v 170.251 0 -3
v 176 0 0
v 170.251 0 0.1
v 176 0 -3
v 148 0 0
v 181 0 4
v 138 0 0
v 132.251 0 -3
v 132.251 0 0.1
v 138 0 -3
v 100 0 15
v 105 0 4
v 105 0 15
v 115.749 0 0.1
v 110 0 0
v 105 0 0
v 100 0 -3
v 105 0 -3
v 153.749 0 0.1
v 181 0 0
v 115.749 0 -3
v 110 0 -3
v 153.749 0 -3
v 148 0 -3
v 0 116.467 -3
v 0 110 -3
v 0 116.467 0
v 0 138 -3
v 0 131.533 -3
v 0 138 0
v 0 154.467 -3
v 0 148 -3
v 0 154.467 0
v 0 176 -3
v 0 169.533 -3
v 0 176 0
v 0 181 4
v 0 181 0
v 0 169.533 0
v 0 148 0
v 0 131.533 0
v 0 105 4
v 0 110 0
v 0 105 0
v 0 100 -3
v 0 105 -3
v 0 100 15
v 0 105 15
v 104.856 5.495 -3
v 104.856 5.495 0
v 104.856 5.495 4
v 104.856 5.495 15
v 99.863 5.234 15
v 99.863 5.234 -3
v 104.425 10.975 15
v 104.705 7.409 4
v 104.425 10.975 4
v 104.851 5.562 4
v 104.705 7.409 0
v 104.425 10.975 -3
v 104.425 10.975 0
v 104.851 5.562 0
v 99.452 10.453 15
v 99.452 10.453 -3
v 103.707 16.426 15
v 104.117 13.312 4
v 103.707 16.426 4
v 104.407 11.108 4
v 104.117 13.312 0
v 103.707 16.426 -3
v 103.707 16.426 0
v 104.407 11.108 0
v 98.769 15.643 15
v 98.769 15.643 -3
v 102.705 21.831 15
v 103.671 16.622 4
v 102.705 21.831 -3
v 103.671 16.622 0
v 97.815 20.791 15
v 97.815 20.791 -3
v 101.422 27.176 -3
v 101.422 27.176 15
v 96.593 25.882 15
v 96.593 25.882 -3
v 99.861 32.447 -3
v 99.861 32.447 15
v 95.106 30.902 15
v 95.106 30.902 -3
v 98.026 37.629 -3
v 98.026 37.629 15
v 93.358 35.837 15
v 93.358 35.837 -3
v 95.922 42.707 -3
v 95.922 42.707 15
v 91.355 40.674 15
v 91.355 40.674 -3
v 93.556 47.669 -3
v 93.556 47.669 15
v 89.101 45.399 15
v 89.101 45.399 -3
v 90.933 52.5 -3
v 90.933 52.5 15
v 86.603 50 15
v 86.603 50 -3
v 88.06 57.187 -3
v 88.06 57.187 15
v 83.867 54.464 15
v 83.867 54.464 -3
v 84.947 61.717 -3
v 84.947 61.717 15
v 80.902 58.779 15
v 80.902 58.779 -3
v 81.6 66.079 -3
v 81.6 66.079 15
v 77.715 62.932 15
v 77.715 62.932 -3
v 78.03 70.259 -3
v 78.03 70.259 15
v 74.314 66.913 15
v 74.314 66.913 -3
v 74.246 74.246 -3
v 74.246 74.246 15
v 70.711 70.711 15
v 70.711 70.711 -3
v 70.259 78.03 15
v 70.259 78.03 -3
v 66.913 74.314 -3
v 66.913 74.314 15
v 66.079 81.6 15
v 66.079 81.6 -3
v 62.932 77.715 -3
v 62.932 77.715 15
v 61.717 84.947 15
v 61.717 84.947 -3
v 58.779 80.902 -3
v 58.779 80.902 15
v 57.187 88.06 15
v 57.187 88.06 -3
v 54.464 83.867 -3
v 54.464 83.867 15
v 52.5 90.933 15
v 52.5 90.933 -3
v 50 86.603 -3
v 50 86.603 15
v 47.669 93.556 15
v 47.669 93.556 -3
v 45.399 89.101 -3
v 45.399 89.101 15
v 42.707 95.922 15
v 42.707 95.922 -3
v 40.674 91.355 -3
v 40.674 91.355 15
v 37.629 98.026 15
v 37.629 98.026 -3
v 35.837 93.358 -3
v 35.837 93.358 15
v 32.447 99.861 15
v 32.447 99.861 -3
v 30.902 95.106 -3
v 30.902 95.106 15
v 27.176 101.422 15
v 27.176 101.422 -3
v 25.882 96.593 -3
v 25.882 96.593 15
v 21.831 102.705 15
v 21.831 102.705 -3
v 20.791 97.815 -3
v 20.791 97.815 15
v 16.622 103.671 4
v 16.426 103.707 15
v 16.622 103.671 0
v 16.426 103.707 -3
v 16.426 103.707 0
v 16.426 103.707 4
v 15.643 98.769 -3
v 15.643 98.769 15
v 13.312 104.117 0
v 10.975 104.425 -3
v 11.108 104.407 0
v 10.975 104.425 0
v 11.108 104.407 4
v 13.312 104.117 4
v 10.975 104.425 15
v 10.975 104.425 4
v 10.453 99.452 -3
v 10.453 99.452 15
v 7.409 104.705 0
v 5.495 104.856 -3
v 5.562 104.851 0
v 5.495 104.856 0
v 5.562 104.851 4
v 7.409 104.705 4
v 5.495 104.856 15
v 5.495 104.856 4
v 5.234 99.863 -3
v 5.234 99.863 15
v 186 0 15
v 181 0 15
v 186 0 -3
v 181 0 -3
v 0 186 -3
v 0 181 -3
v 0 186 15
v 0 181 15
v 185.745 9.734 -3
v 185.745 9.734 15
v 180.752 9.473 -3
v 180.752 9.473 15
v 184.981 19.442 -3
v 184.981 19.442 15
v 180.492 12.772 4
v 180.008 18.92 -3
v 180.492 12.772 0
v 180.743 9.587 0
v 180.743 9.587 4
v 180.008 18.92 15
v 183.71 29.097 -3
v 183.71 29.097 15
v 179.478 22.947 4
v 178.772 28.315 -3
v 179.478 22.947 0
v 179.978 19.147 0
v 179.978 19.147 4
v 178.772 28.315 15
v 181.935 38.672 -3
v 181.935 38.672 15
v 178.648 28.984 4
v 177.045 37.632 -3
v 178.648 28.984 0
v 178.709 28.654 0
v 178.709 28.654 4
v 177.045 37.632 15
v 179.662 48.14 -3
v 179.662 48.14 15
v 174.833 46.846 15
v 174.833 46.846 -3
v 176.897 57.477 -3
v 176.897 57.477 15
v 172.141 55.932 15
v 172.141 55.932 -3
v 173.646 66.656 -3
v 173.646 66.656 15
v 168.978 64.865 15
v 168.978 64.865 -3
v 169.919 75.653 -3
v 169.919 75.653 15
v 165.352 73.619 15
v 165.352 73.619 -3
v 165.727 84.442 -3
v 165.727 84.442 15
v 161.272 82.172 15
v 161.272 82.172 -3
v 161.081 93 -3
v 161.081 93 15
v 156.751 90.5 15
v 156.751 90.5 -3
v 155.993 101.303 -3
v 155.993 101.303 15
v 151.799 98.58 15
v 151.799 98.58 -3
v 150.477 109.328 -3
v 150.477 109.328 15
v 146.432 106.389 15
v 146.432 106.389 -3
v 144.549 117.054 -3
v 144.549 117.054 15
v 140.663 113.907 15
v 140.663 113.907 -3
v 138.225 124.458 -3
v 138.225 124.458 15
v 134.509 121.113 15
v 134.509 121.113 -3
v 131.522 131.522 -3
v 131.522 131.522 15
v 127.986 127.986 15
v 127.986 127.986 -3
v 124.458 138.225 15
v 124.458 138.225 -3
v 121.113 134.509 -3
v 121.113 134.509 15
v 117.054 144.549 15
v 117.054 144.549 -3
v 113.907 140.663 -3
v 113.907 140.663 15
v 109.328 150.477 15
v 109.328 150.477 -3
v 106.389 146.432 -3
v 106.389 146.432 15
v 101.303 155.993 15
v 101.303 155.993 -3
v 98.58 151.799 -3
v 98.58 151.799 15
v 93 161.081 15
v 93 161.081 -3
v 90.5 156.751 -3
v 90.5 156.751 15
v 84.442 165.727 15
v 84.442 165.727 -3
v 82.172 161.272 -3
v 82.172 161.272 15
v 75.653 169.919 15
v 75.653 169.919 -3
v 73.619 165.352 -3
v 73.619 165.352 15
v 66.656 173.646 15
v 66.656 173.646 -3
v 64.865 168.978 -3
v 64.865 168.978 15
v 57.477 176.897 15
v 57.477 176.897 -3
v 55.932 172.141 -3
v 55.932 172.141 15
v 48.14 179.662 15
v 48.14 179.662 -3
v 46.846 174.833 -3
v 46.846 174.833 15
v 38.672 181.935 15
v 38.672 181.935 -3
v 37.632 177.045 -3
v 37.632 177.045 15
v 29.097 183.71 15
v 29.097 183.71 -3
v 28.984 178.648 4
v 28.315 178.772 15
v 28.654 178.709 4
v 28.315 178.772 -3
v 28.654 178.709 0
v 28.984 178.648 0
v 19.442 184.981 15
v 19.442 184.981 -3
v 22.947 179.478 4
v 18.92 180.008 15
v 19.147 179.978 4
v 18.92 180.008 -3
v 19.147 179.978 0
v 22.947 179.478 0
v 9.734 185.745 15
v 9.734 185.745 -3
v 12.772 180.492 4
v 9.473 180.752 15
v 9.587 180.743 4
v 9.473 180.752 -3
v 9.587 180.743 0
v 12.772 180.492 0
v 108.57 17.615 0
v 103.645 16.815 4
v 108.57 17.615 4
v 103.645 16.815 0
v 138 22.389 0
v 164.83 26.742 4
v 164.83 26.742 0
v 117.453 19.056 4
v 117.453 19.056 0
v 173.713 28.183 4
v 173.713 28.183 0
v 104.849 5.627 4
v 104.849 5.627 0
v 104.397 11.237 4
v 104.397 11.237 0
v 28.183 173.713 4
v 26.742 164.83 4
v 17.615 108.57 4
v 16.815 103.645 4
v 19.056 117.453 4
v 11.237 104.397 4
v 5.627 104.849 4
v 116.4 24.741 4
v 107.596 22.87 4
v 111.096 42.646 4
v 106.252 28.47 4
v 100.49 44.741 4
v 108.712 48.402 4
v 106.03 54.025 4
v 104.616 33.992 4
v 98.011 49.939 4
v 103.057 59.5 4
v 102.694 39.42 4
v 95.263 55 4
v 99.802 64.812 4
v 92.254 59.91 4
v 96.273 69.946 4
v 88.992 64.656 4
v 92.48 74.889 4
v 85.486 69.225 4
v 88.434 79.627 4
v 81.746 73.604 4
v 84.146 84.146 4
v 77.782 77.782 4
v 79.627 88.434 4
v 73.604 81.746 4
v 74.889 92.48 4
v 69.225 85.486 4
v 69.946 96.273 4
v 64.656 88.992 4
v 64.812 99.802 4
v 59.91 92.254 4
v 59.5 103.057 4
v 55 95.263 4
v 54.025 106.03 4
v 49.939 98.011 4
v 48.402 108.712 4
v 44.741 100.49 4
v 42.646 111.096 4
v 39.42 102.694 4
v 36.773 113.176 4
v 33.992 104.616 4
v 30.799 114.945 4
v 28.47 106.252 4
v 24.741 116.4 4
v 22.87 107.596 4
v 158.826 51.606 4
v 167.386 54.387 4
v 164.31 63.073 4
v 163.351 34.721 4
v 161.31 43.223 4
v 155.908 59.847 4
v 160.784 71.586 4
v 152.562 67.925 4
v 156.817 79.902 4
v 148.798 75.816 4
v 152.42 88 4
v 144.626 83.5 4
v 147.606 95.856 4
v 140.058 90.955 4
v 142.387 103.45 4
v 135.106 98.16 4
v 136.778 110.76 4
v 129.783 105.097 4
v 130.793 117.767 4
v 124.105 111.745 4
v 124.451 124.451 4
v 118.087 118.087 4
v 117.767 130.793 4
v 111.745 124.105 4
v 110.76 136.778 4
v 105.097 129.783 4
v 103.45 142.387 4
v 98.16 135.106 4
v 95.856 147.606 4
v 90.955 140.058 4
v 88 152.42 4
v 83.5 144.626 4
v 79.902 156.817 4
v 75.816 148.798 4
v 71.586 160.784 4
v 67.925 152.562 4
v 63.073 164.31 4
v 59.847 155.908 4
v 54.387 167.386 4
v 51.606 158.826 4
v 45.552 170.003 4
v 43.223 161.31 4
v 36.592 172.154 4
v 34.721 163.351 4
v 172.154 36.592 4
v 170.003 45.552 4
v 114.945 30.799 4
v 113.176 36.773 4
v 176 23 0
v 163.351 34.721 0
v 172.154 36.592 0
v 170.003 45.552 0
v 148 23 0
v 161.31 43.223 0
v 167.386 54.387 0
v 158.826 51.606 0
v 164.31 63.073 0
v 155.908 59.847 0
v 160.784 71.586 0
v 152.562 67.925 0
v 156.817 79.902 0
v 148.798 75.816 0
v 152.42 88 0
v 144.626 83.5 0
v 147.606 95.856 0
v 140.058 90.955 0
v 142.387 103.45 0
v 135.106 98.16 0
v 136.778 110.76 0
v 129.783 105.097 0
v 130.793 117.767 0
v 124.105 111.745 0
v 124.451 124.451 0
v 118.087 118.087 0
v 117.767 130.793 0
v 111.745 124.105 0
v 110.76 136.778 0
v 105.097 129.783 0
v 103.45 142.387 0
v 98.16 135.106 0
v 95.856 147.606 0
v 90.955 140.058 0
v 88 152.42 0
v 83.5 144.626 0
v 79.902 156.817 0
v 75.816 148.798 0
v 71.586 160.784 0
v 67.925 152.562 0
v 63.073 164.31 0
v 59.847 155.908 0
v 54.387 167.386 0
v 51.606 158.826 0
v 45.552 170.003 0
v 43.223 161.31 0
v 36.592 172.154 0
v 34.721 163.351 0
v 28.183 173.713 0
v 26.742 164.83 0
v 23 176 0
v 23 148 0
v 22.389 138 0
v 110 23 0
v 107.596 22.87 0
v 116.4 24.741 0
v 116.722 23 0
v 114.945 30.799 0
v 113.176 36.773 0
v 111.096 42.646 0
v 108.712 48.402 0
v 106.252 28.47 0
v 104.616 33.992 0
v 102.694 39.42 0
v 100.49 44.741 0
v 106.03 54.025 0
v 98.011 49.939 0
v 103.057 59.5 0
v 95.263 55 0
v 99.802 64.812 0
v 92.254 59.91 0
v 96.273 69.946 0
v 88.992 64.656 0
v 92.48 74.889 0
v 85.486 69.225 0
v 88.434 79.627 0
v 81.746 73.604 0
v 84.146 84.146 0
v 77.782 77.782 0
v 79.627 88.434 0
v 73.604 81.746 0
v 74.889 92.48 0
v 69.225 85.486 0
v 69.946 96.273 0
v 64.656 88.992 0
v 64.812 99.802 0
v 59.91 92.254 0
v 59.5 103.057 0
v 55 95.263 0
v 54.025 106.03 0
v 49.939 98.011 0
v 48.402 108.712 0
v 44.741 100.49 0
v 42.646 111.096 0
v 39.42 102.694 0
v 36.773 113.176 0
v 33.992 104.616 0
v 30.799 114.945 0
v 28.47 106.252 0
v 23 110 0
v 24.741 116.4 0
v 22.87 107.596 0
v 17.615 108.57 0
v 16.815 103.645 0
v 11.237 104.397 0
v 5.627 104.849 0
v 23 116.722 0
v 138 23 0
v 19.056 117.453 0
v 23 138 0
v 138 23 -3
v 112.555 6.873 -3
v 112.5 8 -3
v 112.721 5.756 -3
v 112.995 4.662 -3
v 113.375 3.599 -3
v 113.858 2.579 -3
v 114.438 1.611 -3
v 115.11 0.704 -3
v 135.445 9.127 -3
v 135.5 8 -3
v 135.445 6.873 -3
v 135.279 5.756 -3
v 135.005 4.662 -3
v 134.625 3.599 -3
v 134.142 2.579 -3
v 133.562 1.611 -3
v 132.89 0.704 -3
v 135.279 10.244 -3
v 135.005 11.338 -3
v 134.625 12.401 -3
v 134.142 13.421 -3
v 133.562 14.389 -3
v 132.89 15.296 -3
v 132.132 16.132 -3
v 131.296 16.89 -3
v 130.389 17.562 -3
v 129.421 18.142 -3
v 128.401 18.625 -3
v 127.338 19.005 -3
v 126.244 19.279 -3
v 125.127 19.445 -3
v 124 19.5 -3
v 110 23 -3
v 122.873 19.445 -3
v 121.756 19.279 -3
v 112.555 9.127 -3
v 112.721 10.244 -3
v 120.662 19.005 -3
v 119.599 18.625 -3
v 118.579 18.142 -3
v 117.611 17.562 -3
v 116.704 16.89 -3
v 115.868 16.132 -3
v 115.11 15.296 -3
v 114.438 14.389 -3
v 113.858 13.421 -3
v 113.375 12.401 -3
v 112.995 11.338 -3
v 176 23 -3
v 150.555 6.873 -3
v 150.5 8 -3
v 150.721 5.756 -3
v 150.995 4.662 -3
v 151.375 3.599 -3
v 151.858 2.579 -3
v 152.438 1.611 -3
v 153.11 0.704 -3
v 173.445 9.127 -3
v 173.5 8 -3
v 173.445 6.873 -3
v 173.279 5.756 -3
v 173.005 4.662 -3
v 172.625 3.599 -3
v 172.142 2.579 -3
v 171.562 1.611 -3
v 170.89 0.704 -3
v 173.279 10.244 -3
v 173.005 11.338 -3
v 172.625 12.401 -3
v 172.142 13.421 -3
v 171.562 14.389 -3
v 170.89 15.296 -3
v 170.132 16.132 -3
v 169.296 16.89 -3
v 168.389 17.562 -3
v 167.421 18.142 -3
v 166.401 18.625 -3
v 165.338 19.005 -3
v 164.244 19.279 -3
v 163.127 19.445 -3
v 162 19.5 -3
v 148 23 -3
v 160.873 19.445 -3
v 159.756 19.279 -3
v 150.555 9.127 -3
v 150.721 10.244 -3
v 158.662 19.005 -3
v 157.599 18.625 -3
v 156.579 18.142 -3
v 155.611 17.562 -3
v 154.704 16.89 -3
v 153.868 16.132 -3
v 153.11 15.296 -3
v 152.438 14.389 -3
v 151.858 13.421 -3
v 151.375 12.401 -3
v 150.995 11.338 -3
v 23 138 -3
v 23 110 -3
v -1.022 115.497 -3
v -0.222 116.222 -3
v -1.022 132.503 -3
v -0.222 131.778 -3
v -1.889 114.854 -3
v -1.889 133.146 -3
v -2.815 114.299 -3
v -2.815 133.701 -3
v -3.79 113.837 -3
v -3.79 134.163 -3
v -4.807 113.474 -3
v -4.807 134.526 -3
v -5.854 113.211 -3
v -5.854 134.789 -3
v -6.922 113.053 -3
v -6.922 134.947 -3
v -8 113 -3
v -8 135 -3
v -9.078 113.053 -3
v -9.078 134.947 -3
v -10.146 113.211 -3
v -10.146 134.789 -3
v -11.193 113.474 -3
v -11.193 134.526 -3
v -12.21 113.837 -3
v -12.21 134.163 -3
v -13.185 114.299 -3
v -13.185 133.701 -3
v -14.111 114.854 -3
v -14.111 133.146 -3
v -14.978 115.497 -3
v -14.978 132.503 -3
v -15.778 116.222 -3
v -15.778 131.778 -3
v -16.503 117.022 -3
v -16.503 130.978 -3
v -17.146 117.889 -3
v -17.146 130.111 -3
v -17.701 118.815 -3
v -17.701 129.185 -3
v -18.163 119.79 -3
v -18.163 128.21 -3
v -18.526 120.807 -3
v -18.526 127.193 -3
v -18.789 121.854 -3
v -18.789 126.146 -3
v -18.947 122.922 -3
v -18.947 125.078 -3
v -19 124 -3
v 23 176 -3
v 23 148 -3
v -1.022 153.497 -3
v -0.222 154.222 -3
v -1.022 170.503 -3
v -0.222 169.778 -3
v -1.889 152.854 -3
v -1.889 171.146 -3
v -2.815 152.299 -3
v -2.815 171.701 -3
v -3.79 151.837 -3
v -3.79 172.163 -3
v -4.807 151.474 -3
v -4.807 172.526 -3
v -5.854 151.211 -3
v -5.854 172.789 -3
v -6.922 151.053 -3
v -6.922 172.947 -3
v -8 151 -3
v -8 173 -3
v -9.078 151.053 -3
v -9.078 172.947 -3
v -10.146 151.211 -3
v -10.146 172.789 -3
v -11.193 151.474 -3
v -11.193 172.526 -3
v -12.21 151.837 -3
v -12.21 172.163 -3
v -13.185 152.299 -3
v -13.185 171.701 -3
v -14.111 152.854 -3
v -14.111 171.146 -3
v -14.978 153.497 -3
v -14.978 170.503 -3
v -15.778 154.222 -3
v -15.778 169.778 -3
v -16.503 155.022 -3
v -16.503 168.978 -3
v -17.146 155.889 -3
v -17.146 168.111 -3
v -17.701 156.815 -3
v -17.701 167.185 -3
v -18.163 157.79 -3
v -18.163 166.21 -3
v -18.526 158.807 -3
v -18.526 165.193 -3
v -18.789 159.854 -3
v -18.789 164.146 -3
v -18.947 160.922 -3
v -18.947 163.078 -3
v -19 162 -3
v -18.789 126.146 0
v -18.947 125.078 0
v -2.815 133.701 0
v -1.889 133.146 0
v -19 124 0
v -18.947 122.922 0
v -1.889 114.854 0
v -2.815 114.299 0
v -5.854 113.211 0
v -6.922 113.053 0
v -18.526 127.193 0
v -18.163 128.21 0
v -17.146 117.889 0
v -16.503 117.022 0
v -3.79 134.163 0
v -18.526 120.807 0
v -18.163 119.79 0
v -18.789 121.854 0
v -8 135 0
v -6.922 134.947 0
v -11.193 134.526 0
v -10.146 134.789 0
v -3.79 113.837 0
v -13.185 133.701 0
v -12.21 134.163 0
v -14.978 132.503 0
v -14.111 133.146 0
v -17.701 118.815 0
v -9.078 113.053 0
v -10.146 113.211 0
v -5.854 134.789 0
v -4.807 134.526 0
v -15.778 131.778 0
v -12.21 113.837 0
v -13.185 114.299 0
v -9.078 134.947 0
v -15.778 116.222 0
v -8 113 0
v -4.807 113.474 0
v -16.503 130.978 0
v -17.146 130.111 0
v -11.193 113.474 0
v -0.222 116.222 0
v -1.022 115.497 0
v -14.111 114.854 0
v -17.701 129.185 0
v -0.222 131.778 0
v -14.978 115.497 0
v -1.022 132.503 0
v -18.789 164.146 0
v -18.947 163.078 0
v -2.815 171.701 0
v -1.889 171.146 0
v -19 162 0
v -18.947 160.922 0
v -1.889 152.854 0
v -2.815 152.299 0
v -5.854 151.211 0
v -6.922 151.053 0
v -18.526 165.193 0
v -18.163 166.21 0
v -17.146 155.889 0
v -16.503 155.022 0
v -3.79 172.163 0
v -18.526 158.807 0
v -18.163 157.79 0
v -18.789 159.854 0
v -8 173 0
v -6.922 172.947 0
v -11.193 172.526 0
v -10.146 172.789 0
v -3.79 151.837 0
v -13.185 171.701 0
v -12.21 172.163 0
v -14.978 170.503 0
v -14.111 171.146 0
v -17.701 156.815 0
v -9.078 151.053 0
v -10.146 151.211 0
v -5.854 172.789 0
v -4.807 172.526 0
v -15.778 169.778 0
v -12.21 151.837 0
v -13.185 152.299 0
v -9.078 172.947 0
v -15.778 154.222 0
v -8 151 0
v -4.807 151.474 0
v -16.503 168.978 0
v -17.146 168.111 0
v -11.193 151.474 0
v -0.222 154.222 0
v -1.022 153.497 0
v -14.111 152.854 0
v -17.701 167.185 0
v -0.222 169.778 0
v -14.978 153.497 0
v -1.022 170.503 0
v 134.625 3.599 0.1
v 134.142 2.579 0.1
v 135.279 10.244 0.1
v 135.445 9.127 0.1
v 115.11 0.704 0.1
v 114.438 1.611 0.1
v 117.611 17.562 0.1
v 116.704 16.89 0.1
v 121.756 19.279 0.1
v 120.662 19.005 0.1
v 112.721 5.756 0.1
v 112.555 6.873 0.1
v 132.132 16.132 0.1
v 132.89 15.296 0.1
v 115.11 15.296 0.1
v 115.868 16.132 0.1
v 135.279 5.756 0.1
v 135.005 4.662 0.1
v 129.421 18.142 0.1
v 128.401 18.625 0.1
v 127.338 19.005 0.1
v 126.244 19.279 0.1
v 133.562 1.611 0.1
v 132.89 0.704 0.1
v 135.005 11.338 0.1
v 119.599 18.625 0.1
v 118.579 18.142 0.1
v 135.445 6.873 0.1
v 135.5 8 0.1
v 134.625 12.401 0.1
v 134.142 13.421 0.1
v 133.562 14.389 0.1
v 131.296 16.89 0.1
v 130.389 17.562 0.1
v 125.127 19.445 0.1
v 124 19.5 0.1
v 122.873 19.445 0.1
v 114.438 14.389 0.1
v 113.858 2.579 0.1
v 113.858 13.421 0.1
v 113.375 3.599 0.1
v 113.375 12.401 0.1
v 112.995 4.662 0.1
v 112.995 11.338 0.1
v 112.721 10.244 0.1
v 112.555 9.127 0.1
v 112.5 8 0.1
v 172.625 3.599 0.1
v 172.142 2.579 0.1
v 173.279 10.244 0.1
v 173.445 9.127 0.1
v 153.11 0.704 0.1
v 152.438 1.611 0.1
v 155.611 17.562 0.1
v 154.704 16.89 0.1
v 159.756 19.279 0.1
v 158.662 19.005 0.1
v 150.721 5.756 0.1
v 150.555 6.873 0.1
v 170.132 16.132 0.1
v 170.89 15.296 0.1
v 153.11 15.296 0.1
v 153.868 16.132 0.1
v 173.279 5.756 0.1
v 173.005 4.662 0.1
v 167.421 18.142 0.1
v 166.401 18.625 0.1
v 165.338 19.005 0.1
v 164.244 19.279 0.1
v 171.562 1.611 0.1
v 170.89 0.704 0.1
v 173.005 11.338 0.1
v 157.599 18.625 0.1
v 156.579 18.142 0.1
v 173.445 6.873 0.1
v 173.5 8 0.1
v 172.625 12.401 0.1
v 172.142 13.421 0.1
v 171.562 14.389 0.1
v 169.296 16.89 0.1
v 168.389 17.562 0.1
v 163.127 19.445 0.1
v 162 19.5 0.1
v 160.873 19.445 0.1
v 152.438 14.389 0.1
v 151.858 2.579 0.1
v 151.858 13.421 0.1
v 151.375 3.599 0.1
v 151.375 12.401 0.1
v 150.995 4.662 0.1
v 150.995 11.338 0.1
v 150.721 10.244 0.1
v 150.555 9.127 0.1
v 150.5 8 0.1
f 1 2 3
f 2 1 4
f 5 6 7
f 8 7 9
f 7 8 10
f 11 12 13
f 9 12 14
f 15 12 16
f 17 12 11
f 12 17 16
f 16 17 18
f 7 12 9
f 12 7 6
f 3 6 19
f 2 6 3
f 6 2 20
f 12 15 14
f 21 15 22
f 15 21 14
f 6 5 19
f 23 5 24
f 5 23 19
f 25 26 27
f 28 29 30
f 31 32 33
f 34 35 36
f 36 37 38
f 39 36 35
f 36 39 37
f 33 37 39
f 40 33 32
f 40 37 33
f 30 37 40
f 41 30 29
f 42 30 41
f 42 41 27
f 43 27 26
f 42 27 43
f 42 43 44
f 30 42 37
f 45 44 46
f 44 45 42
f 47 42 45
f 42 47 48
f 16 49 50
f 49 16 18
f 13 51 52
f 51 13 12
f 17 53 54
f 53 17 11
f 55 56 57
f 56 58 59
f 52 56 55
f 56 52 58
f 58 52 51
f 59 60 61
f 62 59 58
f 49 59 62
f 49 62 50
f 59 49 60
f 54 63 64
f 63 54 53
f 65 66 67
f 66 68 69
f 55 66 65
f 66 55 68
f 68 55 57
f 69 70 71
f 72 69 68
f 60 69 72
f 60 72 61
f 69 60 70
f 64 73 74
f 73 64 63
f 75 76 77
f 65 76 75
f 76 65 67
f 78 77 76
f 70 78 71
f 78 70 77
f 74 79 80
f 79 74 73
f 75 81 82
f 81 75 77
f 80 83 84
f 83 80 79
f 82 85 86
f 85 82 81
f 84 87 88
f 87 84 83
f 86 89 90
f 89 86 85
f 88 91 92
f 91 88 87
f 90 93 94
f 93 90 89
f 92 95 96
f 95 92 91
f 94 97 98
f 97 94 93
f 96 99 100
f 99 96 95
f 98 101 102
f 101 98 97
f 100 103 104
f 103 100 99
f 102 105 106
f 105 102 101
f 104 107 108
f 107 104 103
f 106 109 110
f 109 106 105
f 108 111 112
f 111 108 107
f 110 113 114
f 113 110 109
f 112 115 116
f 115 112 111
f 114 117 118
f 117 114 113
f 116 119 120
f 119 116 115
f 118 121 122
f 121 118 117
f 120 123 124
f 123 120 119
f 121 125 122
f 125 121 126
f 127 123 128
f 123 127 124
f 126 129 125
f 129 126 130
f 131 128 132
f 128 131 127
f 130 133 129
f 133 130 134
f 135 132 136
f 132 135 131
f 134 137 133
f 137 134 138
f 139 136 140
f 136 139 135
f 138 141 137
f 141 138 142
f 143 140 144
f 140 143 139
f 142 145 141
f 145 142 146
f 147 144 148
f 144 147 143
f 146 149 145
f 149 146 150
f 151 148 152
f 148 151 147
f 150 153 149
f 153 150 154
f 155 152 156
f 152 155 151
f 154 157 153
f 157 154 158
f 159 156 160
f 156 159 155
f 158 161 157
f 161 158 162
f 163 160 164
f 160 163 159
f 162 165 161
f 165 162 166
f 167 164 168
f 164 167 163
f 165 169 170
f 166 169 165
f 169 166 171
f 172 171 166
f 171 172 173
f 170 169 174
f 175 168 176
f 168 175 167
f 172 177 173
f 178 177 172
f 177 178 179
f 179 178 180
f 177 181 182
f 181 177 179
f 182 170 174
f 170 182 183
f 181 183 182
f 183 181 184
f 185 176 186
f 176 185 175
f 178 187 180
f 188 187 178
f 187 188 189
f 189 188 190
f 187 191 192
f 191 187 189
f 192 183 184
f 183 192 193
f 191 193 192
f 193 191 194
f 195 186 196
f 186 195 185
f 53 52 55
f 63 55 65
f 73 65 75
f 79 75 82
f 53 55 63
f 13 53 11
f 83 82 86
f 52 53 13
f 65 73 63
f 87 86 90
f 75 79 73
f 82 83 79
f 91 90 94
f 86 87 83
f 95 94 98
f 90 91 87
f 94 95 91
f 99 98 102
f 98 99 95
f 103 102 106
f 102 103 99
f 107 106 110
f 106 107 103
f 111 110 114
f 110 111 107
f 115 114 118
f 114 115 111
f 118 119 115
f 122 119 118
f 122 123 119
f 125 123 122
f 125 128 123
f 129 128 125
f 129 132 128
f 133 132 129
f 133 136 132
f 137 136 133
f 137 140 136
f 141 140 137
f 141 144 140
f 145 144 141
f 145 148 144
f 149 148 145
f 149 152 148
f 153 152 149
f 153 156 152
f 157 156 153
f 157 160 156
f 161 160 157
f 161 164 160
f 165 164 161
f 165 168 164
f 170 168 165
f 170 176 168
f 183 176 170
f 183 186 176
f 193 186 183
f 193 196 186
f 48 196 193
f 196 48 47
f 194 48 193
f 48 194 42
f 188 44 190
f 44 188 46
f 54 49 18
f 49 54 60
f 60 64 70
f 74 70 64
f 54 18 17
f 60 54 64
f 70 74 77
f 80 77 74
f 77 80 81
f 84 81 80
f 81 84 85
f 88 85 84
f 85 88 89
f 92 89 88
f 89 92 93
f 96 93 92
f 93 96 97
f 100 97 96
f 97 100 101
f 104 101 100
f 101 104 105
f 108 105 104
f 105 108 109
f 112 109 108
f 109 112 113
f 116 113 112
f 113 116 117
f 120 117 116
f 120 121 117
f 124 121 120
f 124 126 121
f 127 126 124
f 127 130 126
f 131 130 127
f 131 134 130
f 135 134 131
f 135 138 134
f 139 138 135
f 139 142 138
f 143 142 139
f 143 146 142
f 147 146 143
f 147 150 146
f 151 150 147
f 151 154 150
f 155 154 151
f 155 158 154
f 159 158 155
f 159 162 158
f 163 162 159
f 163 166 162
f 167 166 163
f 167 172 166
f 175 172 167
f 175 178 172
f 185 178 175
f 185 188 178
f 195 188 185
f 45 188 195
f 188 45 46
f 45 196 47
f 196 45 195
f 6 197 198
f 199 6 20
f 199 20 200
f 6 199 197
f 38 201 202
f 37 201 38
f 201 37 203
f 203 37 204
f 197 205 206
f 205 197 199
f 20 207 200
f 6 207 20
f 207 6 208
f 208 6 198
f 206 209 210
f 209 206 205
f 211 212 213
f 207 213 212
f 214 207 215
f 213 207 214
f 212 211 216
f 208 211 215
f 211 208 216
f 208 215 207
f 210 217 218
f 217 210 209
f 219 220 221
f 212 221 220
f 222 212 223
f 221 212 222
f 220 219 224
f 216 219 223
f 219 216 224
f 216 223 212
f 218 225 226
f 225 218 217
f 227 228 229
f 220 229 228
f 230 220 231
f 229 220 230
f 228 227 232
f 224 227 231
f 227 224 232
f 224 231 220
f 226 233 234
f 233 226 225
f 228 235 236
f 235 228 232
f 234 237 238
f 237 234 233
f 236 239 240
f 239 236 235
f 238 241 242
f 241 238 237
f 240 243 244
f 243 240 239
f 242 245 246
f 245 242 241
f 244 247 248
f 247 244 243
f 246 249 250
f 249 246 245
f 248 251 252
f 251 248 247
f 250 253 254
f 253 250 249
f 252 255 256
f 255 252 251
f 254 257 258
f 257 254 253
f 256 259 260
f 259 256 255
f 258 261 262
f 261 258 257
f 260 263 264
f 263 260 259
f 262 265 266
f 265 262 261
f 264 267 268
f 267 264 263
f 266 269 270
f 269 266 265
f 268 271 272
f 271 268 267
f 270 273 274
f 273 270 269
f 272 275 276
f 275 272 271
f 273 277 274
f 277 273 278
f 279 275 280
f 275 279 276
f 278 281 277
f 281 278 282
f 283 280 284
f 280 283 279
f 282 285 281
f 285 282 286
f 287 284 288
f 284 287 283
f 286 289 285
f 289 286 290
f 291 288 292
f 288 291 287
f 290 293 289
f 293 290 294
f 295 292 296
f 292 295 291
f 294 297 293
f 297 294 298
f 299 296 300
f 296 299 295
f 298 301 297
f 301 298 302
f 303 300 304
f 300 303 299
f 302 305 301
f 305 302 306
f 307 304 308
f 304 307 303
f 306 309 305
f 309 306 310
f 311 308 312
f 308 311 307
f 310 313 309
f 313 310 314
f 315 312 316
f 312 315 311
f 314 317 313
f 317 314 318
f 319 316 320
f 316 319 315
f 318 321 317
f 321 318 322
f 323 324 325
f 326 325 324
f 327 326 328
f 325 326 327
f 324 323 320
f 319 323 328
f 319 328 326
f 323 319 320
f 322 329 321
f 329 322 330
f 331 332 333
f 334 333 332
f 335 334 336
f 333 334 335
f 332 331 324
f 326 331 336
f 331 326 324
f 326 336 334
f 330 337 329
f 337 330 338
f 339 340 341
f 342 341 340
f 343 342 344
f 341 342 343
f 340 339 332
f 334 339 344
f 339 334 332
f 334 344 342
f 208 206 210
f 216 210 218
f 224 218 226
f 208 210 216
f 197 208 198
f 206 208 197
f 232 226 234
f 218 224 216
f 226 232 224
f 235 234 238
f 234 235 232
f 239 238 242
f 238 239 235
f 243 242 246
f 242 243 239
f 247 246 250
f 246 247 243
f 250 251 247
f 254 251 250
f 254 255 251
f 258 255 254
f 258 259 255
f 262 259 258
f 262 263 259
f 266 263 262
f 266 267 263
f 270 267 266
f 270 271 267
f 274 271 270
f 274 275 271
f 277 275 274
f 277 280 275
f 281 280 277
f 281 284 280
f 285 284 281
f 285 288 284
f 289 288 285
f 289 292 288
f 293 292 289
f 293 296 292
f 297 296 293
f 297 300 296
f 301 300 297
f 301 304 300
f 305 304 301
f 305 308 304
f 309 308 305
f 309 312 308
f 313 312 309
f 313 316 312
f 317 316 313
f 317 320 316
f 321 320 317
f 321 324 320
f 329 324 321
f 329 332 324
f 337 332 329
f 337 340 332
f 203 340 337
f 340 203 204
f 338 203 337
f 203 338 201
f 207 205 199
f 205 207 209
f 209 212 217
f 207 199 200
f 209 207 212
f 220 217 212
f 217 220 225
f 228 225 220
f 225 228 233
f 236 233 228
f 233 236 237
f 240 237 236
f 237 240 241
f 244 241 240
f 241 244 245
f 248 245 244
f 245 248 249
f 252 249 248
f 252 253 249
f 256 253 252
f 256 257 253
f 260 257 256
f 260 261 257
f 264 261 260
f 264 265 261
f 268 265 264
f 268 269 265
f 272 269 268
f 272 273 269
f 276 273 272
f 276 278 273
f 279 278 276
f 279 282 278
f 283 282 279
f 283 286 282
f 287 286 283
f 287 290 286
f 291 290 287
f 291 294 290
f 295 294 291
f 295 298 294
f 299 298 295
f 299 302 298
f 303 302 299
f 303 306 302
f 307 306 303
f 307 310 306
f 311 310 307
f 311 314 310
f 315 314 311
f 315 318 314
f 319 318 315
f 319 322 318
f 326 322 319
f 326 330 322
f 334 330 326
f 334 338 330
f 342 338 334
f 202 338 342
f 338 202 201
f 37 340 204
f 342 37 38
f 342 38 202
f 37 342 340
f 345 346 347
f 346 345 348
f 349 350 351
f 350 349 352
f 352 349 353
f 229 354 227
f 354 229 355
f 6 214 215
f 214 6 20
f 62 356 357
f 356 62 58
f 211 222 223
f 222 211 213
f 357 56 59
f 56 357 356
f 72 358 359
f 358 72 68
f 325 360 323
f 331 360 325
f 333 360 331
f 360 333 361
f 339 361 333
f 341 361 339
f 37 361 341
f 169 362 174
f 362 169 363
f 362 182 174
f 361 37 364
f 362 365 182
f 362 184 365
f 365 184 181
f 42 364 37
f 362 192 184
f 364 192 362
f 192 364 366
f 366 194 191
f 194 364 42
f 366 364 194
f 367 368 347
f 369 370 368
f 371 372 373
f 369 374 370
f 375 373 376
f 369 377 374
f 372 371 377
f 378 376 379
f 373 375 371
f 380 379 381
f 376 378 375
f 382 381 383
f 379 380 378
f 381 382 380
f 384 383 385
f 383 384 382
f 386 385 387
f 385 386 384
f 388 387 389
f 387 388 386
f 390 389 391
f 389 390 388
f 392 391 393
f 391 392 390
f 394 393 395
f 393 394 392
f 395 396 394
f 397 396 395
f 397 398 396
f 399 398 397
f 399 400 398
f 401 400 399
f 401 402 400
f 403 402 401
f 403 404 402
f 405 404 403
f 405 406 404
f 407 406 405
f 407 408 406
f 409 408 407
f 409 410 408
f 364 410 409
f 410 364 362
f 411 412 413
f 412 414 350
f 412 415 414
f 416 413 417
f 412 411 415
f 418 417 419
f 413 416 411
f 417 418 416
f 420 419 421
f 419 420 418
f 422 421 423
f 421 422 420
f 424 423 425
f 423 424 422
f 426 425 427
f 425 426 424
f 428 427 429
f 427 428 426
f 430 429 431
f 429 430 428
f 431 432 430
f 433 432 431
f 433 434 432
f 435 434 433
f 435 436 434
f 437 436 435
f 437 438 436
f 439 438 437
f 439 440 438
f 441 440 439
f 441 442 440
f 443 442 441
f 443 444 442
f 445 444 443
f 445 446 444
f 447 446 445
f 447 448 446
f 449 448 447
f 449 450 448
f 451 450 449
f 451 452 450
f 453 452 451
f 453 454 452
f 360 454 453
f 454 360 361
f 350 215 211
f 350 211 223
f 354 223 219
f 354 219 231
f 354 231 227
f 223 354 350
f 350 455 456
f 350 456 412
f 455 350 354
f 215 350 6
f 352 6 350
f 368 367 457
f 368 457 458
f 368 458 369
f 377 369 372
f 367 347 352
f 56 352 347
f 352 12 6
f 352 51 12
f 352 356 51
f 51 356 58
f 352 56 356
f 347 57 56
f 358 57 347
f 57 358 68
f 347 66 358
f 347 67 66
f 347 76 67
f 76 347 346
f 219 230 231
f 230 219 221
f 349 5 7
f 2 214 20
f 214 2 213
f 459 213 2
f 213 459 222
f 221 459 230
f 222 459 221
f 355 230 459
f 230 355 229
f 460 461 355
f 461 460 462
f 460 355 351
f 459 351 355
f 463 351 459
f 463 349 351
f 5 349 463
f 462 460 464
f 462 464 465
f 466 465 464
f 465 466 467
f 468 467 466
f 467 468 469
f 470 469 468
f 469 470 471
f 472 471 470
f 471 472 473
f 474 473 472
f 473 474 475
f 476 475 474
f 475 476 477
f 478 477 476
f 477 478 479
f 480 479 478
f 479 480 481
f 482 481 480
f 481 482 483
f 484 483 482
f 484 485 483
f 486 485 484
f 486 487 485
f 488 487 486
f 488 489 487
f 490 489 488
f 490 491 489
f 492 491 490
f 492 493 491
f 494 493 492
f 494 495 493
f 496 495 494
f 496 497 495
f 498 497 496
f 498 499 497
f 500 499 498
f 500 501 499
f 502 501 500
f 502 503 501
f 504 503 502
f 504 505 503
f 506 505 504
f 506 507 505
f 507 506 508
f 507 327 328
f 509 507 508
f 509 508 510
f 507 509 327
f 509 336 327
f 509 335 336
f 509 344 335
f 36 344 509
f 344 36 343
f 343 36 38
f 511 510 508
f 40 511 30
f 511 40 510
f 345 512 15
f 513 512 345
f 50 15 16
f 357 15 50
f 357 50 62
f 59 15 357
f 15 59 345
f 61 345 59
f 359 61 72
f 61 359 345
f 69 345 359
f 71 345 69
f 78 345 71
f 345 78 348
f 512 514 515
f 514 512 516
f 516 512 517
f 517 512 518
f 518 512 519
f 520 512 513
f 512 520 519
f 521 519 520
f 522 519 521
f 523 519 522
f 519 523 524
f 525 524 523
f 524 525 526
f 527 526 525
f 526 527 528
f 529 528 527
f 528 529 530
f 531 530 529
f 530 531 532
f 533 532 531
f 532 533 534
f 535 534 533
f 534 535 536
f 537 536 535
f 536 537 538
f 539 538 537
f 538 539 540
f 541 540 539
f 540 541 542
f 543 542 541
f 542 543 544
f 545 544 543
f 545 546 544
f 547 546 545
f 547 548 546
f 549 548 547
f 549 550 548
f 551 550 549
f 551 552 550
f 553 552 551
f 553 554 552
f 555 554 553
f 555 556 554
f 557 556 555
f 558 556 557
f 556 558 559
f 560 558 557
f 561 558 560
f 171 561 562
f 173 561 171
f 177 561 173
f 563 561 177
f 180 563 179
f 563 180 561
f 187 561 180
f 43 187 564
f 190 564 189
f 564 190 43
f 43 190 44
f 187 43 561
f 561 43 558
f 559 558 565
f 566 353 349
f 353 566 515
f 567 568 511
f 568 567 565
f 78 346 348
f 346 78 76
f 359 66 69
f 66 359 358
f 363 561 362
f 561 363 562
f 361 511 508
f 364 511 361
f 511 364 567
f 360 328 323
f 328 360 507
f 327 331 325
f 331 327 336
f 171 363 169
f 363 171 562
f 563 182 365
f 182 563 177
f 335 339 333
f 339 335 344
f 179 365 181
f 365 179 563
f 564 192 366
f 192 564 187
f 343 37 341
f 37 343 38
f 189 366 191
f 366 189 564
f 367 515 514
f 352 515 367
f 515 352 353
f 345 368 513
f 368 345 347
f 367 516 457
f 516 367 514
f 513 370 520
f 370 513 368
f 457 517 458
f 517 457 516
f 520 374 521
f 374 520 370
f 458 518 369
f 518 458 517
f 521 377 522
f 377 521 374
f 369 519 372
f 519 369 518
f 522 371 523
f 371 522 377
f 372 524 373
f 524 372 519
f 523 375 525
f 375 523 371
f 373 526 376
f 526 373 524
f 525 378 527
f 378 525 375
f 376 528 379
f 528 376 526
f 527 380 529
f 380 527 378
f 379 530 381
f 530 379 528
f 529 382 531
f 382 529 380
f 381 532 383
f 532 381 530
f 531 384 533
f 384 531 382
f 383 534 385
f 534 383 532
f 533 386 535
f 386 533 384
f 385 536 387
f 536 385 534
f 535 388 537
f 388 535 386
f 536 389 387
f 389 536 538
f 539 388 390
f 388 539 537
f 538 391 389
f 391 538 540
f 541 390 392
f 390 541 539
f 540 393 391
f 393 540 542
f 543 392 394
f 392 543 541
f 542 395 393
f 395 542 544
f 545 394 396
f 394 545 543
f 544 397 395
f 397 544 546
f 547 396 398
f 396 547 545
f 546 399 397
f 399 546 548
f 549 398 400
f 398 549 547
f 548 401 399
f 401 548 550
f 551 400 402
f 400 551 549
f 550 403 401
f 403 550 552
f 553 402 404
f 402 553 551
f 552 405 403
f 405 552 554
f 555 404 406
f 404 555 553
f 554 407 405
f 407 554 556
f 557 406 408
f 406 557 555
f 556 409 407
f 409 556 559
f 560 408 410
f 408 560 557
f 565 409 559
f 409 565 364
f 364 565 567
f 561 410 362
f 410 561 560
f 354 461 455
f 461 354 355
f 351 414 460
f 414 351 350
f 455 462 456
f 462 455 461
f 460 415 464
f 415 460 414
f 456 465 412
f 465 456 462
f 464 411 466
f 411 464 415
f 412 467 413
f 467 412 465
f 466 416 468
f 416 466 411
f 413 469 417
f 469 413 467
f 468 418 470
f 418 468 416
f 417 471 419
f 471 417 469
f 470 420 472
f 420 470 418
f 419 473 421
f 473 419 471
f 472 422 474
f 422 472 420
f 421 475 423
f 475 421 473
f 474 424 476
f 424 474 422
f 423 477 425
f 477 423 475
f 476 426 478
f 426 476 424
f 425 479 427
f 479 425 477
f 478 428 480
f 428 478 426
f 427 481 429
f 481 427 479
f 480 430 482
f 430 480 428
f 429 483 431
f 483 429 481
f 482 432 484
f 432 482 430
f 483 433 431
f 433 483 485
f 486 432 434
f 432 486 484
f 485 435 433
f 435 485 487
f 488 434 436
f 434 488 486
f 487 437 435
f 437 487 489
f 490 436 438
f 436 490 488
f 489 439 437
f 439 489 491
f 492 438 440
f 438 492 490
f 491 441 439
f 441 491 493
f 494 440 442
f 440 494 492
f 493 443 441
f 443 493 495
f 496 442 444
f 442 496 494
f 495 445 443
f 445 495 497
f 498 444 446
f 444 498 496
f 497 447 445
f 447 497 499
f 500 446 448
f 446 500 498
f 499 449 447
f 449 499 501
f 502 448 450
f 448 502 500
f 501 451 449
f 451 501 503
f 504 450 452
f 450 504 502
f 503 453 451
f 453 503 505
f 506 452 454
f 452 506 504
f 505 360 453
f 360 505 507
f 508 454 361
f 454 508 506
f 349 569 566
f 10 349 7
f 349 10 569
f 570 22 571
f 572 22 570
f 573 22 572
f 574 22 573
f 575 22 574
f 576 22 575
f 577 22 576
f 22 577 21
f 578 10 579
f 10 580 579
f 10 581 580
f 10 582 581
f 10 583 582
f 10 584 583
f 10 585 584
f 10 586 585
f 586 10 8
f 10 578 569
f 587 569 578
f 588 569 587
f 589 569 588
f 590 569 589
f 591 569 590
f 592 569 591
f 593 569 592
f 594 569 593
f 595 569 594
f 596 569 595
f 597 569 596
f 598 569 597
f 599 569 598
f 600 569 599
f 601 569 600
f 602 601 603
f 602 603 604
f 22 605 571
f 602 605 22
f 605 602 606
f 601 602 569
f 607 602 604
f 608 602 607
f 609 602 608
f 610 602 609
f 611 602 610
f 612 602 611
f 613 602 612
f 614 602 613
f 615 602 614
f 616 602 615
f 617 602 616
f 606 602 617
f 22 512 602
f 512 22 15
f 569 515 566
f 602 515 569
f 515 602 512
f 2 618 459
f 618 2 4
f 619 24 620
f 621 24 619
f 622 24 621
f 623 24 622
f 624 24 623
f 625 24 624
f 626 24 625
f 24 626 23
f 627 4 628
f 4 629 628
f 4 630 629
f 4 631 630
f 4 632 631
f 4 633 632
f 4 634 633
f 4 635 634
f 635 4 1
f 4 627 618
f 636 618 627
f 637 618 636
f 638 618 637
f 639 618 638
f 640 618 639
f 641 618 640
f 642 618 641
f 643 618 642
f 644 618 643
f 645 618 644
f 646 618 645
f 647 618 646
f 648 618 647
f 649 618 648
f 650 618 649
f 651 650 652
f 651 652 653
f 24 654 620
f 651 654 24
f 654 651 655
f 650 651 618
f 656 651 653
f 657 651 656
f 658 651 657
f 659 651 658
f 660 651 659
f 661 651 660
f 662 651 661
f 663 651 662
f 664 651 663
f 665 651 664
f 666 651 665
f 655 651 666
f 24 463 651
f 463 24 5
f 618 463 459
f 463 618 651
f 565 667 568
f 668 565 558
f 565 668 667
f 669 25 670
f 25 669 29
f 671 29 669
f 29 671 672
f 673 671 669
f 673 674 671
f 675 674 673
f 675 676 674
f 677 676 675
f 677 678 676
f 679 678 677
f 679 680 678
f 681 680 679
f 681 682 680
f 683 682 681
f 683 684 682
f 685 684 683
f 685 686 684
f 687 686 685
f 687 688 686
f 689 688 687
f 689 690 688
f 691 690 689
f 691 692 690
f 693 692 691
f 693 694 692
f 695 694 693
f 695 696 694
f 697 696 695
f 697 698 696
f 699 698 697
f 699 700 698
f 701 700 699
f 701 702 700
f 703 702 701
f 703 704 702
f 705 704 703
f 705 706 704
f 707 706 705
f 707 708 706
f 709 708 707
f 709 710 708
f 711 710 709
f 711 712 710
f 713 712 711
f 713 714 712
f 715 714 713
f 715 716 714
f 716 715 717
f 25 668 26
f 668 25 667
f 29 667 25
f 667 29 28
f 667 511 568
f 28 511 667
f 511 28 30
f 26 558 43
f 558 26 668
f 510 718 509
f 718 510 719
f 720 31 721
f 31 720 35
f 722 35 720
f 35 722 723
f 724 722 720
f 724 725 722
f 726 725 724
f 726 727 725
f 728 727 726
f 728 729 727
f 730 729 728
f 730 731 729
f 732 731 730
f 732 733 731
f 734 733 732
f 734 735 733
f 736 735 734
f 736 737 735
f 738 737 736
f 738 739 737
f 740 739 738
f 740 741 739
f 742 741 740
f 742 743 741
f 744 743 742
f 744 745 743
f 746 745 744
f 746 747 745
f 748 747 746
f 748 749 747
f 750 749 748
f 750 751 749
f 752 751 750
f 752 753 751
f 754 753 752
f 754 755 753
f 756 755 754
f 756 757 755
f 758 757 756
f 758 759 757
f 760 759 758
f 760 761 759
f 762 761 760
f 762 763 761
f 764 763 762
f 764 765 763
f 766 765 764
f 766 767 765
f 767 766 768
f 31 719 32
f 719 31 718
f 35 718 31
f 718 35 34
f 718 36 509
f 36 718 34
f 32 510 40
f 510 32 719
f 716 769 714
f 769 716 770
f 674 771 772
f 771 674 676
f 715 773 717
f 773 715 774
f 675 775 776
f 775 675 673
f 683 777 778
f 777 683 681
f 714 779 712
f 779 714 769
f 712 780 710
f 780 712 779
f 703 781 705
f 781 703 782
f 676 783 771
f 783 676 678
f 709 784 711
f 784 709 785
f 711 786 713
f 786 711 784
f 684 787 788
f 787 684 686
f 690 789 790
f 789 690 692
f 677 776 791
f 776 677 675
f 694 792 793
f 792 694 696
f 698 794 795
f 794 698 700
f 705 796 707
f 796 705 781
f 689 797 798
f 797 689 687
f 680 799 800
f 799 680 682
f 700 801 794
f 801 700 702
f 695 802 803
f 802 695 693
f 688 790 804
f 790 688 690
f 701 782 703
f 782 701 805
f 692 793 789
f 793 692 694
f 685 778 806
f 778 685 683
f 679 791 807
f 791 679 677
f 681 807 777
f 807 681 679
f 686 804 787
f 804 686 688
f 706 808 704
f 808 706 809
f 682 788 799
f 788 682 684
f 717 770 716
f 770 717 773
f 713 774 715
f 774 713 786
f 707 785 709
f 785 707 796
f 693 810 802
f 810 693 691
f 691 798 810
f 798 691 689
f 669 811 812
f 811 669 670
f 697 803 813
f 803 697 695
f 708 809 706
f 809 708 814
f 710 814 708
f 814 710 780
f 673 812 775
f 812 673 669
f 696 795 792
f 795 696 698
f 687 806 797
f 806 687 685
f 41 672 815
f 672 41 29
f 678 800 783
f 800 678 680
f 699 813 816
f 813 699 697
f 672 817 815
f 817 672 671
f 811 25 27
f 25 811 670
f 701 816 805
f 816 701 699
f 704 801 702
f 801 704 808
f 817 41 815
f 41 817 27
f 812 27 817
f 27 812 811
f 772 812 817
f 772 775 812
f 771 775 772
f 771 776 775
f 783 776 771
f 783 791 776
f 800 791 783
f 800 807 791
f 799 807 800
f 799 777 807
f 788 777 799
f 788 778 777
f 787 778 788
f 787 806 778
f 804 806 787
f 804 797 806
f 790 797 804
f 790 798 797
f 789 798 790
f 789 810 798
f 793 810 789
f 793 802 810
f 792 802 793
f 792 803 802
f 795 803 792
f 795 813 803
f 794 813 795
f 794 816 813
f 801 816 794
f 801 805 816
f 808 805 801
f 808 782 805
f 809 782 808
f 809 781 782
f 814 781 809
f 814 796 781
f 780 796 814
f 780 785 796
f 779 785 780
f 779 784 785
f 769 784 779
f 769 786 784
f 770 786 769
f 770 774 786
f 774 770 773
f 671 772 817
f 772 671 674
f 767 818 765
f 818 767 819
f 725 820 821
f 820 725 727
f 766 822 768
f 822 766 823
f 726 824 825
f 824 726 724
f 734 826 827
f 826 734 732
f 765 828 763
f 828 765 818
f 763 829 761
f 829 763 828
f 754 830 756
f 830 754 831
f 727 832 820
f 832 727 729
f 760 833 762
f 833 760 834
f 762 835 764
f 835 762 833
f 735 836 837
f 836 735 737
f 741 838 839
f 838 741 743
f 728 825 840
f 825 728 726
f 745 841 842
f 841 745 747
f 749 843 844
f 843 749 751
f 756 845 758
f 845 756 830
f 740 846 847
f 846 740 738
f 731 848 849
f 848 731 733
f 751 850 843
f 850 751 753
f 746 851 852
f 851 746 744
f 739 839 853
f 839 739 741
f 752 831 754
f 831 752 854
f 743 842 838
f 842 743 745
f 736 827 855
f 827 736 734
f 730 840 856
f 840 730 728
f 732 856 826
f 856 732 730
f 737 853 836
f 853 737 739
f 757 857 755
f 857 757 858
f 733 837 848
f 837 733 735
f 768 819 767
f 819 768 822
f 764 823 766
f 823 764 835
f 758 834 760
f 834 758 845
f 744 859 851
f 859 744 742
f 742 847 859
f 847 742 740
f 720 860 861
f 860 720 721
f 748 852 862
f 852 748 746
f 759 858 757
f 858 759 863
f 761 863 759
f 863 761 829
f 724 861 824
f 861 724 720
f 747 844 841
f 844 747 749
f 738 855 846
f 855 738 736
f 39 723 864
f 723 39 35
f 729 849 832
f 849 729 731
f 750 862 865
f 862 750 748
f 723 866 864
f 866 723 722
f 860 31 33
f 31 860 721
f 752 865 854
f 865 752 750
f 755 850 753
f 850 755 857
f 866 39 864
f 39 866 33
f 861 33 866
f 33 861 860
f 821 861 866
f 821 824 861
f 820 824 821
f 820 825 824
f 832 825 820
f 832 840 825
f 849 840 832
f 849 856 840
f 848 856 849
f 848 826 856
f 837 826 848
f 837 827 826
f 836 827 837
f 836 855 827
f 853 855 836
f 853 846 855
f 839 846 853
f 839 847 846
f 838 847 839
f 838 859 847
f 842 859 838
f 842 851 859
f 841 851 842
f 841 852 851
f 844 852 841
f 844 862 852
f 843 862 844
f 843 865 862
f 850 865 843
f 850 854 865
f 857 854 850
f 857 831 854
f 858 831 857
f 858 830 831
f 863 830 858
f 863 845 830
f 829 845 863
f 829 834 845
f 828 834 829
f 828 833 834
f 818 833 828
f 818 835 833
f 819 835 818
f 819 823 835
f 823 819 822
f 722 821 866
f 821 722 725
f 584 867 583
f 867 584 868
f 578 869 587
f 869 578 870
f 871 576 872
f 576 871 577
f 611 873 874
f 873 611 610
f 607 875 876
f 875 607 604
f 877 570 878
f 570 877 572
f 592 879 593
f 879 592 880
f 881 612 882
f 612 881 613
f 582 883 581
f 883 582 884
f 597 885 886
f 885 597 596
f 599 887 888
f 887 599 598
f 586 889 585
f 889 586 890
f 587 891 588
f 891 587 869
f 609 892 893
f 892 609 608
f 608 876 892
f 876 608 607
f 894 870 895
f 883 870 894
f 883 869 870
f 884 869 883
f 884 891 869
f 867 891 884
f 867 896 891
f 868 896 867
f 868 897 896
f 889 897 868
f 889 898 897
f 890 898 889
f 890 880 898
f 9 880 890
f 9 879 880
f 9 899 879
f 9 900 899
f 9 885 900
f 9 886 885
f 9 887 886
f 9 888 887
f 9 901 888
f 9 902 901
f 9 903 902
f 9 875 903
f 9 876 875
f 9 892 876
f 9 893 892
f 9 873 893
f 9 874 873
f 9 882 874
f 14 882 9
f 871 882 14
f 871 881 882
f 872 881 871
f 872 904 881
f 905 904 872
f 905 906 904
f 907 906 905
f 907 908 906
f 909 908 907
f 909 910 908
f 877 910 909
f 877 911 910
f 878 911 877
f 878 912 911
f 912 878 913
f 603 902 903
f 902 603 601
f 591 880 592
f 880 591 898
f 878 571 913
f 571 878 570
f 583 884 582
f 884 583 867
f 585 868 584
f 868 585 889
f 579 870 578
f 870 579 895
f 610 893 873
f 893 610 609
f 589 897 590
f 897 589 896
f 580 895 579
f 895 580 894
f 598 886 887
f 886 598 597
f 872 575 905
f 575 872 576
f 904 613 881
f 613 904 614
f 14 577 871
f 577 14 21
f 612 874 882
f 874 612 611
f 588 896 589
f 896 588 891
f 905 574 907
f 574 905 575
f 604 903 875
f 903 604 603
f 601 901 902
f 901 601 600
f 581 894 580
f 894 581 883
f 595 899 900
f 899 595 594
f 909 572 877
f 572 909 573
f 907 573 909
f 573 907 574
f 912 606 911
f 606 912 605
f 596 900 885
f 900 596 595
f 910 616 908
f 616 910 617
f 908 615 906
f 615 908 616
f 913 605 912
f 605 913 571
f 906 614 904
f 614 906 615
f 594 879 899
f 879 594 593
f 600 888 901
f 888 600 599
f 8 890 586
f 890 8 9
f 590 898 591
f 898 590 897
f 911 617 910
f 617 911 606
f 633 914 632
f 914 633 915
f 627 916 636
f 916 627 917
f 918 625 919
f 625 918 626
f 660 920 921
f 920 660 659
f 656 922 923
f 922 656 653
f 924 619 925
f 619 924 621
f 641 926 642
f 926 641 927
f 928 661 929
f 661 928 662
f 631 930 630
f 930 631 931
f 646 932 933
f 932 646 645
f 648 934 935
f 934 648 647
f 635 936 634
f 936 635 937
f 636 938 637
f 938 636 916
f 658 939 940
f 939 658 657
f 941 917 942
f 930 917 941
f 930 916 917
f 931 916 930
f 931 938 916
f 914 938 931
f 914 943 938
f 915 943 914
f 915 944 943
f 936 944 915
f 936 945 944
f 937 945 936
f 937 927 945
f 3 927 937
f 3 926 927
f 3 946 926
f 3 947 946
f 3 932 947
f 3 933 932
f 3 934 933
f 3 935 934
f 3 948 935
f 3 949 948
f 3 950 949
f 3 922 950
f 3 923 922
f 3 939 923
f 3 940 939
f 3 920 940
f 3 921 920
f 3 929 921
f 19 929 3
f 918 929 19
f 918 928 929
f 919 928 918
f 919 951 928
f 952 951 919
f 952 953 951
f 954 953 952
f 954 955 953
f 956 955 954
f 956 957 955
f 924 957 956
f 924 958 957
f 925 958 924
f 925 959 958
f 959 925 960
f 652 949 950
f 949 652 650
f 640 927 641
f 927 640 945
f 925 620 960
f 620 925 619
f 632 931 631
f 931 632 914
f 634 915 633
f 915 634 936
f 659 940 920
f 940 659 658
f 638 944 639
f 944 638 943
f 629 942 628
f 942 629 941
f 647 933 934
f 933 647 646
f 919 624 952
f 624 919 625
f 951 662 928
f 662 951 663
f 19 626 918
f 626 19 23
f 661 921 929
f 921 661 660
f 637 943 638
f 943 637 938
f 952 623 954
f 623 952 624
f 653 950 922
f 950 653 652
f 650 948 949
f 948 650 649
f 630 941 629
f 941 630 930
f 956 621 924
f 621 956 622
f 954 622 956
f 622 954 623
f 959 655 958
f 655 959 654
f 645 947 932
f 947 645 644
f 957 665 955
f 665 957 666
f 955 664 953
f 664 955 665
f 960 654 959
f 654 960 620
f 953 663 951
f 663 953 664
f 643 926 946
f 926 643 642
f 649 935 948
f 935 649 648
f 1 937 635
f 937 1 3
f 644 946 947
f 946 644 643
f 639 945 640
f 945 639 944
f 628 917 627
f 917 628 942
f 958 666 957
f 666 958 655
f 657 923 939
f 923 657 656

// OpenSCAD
// file: params.scad
// ── Shared parameters for card track system ──────────────────────────────────

// 608ZZ skateboard bearing
bearing_od = 22;
bearing_id = 8;
bearing_w  = 7;

// Track channel (straight and corner sections share this profile)
// body 50 mm + posts 10 mm each side = 70 mm total → 3 mm clearance each side in 76 mm channel
track_inner_w   = 76;    // inner width of U-channel
track_wall_h    = 11;    // wall height above floor
track_wall_t    = 5;     // wall thickness
track_floor_t   = 4;     // floor thickness
track_sec_len   = 200;   // length of one straight section

// Bearing contact floor rails — narrow floor strips along the two bearing lines.
// The floor is ONLY present at (a) these two rails and (b) full-width end sections
// under the connector pads.  Everything else is open to save material.
//
//  Floor plan view (bottom of straight section):
//   [=====END FLOOR=====]  ← full width, conn_pad_len deep
//   |  |             |  |
//   |  | rail   rail |  |  ← two 9 mm rails running full length
//   |  |             |  |
//   [=====END FLOOR=====]
//
// Rail X positions: bearing midpoint sits at (channel_centre ± body_half ∓ bearing_w/2)
// Left  rail centre: track_wall_t + track_inner_w/2 − cart_body_w/2 − bearing_w/2
// Right rail centre: track_wall_t + track_inner_w/2 + cart_body_w/2 + bearing_w/2
bear_rail_w = bearing_w + 2;  // 9 mm — bearing width + 2 mm margin

// Track end connectors — puzzle-piece tabs on the track underside.
// The two outer walls extend bot_ext mm below the floor face (Z=0); connector
// pads fill the gap between them at each end.  No side protrusions — the cart
// channel is completely clear.
//
//  Side view at end face (track lying on table):
//
//    ════════════════════════  ← track walls / floor (Z = 0 and up)
//    |   [ pad ]  [ pad ]  |  ← connector pads hang below floor
//    |___[_tab__]_[_tab__]_|  ← tabs protrude beyond the end face
//      left wall        right wall
//

tab_neck_w   = 12;           // neck width
tab_neck_l   = 8;            // neck length (protrusion from pad end face)
tab_knob_d   = 22;           // knob diameter — wider than neck, creates interlock
tab_clr      = 1.0;          // total clearance on width/diameter (0.5 mm per side)

conn_pad_w   = tab_knob_d + 6;                  // 28 mm — pad / tab cross-section width
conn_pad_len = tab_neck_l + tab_knob_d / 2 + 4; // 23 mm — pad depth / tab reach

// Height of wall extension below Z=0; also the extrusion height of the connector pads.
bot_ext = 3;

// X centres of the two connector pads — quarter-points of the inner channel.
// Pad 1 centre ≈ 24 mm from left edge; Pad 2 centre ≈ 62 mm from left edge.
// (track_wall_t = 5; inner = 76; quarters at 5+19=24 and 5+57=62)
bot_conn_x1 = track_wall_t + track_inner_w * 0.25;
bot_conn_x2 = track_wall_t + track_inner_w * 0.75;

// Cart
cart_plate   = 200;    // 200 × 200 mm top plate
plate_t      = 4;      // plate thickness (thicker to give pegs something to grip)
// body is 50 mm wide; posts (10 mm each side) bring total to 70 mm → 3 mm clearance each side in 76 mm channel
cart_body_w  = 50;
cart_body_h  = 22;     // height of cart body — reduced 4 mm from original 26 mm
wheelbase    = 120;    // front-to-rear axle spacing
cart_body_len = wheelbase + 20;  // 140 mm front-to-rear
cart_wall_t   = 7;               // hollow cart body wall thickness (all four sides)

// Alignment pegs (body → plate)
// Pegs sit at the 4 solid corners of the body top face, outside the lightening pocket.
// Plate holes are through-holes; pegs protrude above the plate surface for grip during gluing.
peg_d    = 4.0;   // peg cylinder diameter
peg_h    = 7.0;   // peg height above body top face (extends 3 mm above plate)
hole_d   = 4.3;   // plate hole diameter (0.3 mm clearance — easy slide, glue fills gap)

// Stub-axle posts (bearing friction-fit over post)
post_d       = 8.2;   // 0.2 mm press-fit onto 608ZZ bore (8 mm)
// post breakdown: 1.5 mm shoulder gap + 7 mm bearing + 1.5 mm retention nose = 10 mm
post_len     = 10;
// post centre sits 9 mm above cart body bottom face:
//   bearing centre = 11 mm above track floor  (= bearing_od/2)
//   cart body bottom clears floor by 2 mm      (= 11 - 9)
post_z       = 9;

// Circular relief cut into the body side face at each post base.
// Prevents the bearing outer race from rubbing against the body during spin.
bearing_relief_d     = bearing_od + 4;   // 26 mm diameter
bearing_relief_depth = 1.5;              // axial depth of relief pocket

// Corner
corner_inner_r = 100;  // inner radius of corner track centre-line
// main file
include <params.scad>

// ── 90° corner track section ──────────────────────────────────────────────────
// Entry face at θ=0° (Y=0 plane): sockets receive tabs from a straight section.
// Exit  face at θ=90° (X=0 plane): tabs protrude in −X.
//
// Floor treatment: full floor at entry/exit connector-end arcs; open in the
// middle.  Two bearing-arc strips run the full 90° to give bearings a rolling
// surface throughout the turn.

track_total_w = track_inner_w + 2 * track_wall_t;
track_total_h = track_floor_t + track_wall_h;

// Bearing arc radii (distance from rotation axis to bearing contact line)
bear_r_L = corner_inner_r + track_wall_t + track_inner_w / 2 - cart_body_w / 2 - bearing_w / 2;
bear_r_R = corner_inner_r + track_wall_t + track_inner_w / 2 + cart_body_w / 2 + bearing_w / 2;

// Arc angle to cover conn_pad_len at the floor centreline radius
corner_cl_r = corner_inner_r + track_wall_t + track_inner_w / 2;
pad_angle   = conn_pad_len / corner_cl_r * 180 / PI;  // ≈ 9.2°

// ── 2D puzzle profiles ────────────────────────────────────────────────────────
module puzzle_tab_2d() {
    translate([-tab_neck_w / 2, 0])
        square([tab_neck_w, tab_neck_l]);
    translate([0, tab_neck_l])
        circle(d = tab_knob_d, $fn = 64);
}

module puzzle_socket_2d() {
    translate([-(tab_neck_w + tab_clr) / 2, 0])
        square([tab_neck_w + tab_clr, tab_neck_l + tab_clr / 2]);
    translate([0, tab_neck_l])
        circle(d = tab_knob_d + tab_clr, $fn = 64);
}

// ── Swept walls (inner + outer, full 90°, with bot_ext extension below floor) ─
// In rotate_extrude, profile Y = 3D Z.  Y = -bot_ext → Z = -bot_ext.
module corner_walls() {
    // Inner wall
    rotate_extrude(angle = 90, $fn = 120)
        translate([corner_inner_r, -bot_ext, 0])
            square([track_wall_t, track_total_h + bot_ext]);
    // Outer wall
    rotate_extrude(angle = 90, $fn = 120)
        translate([corner_inner_r + track_inner_w + track_wall_t, -bot_ext, 0])
            square([track_wall_t, track_total_h + bot_ext]);
}

// ── End floor arcs (full inner width, pad_angle deep at each end) ─────────────
module corner_end_floors() {
    // Entry end (0° to pad_angle)
    rotate_extrude(angle = pad_angle, $fn = 120)
        translate([corner_inner_r + track_wall_t, 0, 0])
            square([track_inner_w, track_floor_t]);
    // Exit end (90° - pad_angle to 90°)
    rotate([0, 0, 90 - pad_angle])
        rotate_extrude(angle = pad_angle, $fn = 120)
            translate([corner_inner_r + track_wall_t, 0, 0])
                square([track_inner_w, track_floor_t]);
}

// ── Bearing contact arc strips (full 90°, narrow rings at each bearing radius) ─
module corner_bearing_rails() {
    rotate_extrude(angle = 90, $fn = 120)
        translate([bear_r_L - bear_rail_w / 2, 0, 0])
            square([bear_rail_w, track_floor_t]);
    rotate_extrude(angle = 90, $fn = 120)
        translate([bear_r_R - bear_rail_w / 2, 0, 0])
            square([bear_rail_w, track_floor_t]);
}

// ── Entry face (θ=0°, Y=0): sockets ──────────────────────────────────────────
module entry_bot_pads() {
    for (cx = [corner_inner_r + bot_conn_x1, corner_inner_r + bot_conn_x2])
        translate([cx - conn_pad_w / 2, 0, -bot_ext])
            cube([conn_pad_w, conn_pad_len, bot_ext]);
}

module entry_bot_sockets() {
    for (cx = [corner_inner_r + bot_conn_x1, corner_inner_r + bot_conn_x2])
        translate([cx, 0, -bot_ext - 0.1])
            linear_extrude(height = bot_ext + 0.2)
                puzzle_socket_2d();
}

// ── Exit face (θ=90°, X=0): tabs protruding in −X ────────────────────────────
module exit_bot_pads() {
    for (cy = [corner_inner_r + bot_conn_x1, corner_inner_r + bot_conn_x2])
        translate([0, cy - conn_pad_w / 2, -bot_ext])
            cube([conn_pad_len, conn_pad_w, bot_ext]);
}

module exit_bot_tabs() {
    for (cy = [corner_inner_r + bot_conn_x1, corner_inner_r + bot_conn_x2])
        translate([0, cy, -bot_ext])
            rotate([0, 0, 90])
                linear_extrude(height = bot_ext)
                    puzzle_tab_2d();
}

// ── Assembled corner ──────────────────────────────────────────────────────────
difference() {
    union() {
        corner_walls();
        corner_end_floors();
        corner_bearing_rails();
        entry_bot_pads();
        exit_bot_pads();
        exit_bot_tabs();
    }
    entry_bot_sockets();
}
